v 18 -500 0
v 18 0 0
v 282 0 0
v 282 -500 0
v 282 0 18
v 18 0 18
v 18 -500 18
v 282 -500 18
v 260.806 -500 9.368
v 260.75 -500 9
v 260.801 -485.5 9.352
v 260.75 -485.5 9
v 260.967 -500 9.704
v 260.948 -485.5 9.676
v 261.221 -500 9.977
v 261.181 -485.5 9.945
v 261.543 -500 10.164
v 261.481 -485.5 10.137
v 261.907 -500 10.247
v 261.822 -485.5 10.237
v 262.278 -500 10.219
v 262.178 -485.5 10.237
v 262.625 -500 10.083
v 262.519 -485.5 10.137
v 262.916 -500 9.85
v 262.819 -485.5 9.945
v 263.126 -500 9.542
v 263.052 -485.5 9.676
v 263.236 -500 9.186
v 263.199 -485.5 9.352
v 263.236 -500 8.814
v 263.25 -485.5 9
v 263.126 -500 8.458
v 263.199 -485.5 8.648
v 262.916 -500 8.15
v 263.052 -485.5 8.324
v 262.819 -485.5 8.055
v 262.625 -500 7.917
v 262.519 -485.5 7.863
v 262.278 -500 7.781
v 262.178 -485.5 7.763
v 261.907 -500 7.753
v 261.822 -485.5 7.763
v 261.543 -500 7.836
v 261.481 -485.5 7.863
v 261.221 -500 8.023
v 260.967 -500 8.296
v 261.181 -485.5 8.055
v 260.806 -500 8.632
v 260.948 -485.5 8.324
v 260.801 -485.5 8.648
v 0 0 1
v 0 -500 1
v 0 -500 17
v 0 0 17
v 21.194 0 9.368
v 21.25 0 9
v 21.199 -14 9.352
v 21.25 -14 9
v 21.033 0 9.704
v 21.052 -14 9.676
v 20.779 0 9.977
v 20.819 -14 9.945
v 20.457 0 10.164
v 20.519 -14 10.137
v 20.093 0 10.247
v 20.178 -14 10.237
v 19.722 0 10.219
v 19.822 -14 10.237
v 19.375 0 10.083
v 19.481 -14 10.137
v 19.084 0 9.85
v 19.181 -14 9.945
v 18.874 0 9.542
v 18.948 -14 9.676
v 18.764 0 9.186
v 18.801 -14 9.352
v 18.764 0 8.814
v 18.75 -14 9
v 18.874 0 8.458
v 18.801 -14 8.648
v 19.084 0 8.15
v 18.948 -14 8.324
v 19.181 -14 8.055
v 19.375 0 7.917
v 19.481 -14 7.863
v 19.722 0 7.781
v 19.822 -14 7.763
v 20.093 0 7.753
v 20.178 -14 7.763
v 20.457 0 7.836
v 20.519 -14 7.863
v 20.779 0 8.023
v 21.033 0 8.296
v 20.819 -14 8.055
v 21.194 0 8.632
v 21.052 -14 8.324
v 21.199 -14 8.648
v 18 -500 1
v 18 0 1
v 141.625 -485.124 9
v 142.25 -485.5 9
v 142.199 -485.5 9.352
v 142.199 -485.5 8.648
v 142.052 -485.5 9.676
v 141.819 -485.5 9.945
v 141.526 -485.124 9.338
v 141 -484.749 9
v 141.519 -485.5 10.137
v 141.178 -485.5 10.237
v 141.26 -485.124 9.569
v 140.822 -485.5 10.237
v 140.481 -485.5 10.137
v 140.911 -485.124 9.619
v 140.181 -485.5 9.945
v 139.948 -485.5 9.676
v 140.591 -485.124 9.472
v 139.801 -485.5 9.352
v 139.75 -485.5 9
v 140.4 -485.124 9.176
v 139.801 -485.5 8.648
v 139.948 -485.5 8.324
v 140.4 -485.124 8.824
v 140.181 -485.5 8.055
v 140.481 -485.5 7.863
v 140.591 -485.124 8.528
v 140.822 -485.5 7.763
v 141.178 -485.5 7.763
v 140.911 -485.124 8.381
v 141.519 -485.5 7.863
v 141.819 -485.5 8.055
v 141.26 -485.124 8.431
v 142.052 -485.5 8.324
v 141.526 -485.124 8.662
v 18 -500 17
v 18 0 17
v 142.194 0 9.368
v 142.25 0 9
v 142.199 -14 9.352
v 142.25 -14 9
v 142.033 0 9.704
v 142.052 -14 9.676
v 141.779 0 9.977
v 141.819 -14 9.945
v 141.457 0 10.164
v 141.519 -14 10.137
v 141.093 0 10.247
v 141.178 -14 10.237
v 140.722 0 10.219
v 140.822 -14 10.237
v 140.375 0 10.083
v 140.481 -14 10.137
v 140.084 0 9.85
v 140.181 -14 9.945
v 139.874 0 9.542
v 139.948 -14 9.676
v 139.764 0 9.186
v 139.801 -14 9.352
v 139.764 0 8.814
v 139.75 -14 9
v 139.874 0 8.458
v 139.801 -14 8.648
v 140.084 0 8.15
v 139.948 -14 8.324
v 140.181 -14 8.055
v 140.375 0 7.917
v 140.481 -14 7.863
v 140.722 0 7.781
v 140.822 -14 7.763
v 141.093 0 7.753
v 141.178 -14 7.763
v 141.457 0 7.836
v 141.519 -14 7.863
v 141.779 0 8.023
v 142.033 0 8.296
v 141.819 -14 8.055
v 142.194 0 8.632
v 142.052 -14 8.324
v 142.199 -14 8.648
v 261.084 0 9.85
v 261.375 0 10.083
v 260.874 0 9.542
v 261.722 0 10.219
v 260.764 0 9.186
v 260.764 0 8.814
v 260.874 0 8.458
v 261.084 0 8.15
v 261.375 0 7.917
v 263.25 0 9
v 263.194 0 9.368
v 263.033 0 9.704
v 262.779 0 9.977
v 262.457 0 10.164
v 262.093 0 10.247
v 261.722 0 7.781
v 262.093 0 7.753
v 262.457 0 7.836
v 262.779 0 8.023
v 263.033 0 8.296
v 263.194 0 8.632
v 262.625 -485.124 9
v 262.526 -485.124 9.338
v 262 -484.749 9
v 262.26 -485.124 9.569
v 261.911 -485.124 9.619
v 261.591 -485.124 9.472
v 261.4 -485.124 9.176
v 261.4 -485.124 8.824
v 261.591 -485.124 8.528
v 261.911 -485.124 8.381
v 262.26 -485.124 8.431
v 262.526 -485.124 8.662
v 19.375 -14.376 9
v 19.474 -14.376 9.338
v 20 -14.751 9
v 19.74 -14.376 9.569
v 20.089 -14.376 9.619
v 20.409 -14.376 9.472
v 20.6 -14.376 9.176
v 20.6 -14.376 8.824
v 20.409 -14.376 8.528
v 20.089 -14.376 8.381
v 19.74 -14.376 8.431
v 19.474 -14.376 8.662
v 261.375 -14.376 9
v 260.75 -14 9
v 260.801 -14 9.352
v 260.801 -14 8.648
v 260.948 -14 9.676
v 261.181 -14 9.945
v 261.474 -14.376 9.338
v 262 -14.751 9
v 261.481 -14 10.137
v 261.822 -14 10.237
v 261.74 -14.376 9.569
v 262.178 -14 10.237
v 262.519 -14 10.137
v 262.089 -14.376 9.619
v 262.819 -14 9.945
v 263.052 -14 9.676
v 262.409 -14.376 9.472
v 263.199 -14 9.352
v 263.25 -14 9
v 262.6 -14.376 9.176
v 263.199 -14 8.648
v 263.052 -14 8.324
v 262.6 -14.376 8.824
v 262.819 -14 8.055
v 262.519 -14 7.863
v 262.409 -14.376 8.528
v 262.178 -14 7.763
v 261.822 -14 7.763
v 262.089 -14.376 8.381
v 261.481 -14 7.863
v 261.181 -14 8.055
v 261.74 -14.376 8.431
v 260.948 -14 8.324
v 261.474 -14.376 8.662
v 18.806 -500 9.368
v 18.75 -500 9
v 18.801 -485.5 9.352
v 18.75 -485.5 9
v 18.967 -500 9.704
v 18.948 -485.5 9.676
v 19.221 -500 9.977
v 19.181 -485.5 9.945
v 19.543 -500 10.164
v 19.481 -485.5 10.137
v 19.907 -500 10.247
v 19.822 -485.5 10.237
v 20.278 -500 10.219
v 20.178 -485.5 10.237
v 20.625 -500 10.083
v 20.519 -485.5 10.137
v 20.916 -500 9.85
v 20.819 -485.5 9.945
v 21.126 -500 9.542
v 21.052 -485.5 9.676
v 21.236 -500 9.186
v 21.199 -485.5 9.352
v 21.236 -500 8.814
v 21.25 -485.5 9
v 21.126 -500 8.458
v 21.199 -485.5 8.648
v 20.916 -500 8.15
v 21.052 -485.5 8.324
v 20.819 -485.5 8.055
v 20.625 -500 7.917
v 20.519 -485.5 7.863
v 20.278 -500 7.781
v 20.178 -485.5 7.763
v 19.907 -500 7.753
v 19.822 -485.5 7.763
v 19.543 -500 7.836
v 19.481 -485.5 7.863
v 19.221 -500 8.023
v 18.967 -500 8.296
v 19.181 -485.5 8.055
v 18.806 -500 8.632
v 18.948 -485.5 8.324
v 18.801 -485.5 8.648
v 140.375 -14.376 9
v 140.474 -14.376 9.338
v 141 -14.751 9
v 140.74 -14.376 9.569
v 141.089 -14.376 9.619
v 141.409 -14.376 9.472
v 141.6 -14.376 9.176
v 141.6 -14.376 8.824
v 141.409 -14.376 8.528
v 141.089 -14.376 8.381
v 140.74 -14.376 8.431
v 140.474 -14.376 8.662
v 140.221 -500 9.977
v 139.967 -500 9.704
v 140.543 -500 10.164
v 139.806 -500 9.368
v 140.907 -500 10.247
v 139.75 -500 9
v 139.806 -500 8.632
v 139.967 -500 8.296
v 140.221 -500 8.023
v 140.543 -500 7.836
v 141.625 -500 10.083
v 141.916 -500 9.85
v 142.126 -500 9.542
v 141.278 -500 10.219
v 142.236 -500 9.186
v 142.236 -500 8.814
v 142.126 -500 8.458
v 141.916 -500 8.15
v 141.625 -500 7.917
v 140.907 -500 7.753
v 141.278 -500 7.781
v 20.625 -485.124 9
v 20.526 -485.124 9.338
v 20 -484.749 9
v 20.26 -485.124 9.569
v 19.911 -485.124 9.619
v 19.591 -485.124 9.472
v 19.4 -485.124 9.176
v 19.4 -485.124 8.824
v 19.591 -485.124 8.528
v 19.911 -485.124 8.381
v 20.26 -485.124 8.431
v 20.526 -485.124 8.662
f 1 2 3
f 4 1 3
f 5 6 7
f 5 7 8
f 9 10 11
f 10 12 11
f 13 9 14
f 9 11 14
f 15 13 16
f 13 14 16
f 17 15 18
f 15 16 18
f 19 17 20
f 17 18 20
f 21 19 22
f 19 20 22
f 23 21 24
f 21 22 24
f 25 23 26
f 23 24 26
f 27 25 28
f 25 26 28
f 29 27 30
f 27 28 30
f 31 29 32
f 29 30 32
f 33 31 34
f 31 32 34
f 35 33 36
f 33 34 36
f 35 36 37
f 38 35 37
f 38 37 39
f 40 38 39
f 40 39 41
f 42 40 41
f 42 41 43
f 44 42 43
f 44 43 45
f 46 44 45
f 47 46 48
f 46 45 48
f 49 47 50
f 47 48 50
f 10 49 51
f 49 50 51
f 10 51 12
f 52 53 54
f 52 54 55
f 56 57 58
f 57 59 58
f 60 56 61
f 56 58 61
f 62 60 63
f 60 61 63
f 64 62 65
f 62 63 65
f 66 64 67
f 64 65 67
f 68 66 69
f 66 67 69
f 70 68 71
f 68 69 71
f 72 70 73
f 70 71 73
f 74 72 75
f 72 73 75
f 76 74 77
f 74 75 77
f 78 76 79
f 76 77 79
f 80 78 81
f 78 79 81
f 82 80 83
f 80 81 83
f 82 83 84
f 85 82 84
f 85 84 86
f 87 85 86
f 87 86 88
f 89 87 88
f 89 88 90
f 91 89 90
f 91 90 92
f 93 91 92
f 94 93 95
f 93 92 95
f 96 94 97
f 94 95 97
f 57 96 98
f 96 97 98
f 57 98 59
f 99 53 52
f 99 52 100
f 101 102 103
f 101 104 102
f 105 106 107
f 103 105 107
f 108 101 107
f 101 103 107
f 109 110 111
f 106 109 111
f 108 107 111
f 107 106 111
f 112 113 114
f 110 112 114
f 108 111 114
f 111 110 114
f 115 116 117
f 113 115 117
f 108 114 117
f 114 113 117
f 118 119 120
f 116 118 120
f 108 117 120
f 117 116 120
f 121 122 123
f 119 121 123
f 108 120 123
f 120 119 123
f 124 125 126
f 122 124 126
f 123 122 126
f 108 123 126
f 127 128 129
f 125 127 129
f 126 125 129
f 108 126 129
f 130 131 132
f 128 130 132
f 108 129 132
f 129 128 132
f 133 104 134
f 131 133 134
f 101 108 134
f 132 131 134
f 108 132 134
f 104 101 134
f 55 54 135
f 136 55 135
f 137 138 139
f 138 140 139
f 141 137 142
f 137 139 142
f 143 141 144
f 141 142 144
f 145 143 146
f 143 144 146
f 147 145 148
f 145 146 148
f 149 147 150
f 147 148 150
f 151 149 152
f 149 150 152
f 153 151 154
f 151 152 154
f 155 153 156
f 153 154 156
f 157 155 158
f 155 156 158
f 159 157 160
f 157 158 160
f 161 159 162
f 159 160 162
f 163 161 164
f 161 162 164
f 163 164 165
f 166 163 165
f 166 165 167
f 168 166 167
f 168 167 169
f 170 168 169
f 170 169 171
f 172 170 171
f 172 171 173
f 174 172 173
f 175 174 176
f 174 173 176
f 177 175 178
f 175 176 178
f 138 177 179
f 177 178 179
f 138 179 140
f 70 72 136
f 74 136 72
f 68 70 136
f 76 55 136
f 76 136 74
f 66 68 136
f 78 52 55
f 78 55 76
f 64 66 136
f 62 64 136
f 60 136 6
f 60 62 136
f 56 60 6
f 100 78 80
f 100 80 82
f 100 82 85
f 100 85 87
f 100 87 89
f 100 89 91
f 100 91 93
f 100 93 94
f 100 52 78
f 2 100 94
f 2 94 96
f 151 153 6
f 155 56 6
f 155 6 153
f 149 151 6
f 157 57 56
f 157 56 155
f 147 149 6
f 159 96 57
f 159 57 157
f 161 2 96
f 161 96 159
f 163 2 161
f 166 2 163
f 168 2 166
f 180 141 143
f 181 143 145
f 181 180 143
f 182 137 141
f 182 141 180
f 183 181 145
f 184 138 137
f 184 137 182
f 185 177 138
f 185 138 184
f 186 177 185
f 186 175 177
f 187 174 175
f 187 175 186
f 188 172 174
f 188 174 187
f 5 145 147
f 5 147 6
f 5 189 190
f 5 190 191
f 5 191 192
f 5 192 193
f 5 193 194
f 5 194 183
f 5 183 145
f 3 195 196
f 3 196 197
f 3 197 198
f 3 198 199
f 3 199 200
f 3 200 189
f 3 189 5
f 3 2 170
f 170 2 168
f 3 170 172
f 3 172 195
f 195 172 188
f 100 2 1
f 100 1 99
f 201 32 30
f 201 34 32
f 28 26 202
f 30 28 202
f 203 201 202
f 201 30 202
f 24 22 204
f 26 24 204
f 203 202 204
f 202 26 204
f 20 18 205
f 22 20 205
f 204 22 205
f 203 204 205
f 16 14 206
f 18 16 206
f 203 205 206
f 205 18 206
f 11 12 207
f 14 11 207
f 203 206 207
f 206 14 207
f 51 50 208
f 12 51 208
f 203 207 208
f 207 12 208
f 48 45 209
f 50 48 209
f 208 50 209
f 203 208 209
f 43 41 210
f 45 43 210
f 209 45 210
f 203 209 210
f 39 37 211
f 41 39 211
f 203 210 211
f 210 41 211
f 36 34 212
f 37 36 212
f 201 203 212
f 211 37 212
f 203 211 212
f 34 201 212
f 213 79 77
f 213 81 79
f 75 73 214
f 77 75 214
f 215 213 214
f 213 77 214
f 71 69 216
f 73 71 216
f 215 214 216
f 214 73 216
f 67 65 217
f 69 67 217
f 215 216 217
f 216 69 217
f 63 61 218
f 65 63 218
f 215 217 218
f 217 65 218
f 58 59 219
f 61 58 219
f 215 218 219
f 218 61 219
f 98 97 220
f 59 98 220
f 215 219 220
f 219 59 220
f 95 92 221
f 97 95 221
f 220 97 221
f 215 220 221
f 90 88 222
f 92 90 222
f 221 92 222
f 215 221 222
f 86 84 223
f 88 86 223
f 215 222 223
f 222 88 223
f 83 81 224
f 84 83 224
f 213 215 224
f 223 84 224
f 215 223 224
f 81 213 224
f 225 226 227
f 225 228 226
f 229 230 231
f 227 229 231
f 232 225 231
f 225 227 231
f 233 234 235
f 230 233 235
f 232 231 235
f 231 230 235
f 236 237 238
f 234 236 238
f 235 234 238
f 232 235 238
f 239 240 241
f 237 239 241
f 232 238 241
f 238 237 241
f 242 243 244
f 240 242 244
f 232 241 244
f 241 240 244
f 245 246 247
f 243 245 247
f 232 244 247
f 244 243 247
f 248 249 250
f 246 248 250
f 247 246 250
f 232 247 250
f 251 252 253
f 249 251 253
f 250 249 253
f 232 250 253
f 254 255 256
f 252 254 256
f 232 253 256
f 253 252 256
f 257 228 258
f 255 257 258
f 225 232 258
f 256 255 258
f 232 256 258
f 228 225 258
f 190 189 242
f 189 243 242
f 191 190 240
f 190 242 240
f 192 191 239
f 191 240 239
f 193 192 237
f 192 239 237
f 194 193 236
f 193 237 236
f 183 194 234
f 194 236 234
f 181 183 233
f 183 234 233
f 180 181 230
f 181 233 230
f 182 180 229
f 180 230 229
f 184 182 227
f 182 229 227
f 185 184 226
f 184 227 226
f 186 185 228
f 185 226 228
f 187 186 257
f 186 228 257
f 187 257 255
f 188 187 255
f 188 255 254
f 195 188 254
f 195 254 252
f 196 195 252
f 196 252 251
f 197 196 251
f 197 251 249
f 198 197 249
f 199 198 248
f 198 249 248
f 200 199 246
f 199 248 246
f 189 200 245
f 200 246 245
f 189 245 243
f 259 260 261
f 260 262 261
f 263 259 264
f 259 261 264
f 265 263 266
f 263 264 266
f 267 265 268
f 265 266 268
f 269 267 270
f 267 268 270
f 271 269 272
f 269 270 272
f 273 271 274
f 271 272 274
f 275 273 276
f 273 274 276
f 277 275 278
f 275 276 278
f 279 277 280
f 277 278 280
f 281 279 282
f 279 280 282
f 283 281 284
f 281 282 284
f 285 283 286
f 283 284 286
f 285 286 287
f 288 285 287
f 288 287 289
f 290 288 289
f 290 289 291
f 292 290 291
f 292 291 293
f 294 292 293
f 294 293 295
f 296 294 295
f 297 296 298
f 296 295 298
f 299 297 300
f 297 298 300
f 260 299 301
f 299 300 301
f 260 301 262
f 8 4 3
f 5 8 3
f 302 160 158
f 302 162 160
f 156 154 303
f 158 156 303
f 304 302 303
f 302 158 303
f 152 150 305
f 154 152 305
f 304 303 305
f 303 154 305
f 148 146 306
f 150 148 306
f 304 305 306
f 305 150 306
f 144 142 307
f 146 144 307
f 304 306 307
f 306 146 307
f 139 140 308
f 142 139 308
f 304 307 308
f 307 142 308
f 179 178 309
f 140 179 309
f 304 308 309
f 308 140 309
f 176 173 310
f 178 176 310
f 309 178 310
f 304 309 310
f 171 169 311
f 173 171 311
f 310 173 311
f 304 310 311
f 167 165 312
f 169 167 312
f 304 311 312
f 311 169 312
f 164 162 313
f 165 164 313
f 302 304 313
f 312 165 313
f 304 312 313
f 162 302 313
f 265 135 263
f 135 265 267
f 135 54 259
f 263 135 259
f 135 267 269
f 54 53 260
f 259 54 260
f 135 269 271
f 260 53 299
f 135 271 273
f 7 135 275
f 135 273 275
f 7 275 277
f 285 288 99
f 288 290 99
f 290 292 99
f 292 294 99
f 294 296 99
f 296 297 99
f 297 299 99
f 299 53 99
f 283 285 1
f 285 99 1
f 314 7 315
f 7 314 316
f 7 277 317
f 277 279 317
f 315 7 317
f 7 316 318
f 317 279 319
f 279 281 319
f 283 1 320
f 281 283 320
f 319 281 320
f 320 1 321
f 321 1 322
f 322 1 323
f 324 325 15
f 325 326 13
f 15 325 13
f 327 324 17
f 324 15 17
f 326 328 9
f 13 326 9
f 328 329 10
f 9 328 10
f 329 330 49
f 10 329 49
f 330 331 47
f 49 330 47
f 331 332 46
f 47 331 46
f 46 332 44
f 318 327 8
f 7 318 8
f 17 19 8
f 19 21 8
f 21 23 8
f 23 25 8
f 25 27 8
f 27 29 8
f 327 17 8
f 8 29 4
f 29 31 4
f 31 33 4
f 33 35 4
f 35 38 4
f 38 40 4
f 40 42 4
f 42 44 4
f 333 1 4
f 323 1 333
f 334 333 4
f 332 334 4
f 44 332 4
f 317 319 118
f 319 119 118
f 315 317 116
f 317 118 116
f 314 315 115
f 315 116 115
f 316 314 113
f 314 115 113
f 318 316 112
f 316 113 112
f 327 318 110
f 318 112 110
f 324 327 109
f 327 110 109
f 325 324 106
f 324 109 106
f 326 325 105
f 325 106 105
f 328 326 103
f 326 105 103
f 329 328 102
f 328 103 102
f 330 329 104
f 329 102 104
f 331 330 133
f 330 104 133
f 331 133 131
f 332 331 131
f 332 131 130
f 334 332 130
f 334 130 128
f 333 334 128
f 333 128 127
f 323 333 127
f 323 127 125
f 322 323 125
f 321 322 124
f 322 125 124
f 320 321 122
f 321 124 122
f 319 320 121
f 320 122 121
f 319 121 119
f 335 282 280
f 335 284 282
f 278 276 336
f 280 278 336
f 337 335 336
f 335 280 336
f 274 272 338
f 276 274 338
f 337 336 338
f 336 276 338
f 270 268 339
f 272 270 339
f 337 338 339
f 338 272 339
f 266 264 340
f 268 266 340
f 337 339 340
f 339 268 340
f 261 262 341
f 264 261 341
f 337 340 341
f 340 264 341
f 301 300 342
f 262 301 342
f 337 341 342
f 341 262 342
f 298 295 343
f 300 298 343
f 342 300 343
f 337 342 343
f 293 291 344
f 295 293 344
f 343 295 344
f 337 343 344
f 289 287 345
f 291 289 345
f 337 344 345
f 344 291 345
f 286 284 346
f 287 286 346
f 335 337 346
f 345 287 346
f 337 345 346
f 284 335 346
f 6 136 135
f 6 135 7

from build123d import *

# Parameters (mm, degrees)
F0_W     = 282
F0_H     = 500
F1_DEPTH = 18
F3_D     = 2.5
F3_DEPTH = 14.5
F3_TIP   = 0.7510757738
F5_D     = 2.5
F5_DEPTH = 14
F5_TIP   = 0.7510757738
F6_W     = 18
F6_H     = 1
F7_DEPTH = 500.001


with BuildPart() as f1:
    # F0 (on Top) → F1 (new body)
    with BuildSketch(Plane.XY):
        with Locations((141, -250)):
            Rectangle(F0_W, F0_H)
    extrude(amount=F1_DEPTH)

    # F3
    with Locations(Plane.XZ.offset(500)):
        with Locations((20, 9), (141, 9), (262, 9)):
            Hole(F3_D / 2, depth=F3_DEPTH)
            with Locations((0, 0, -(F3_DEPTH + F3_TIP / 2))):  # 118° drill point
                Cone(0, F3_D / 2, F3_TIP, mode=Mode.SUBTRACT)

    # F5
    with Locations(Plane(origin=(0, 0, 0), x_dir=(-1, 0, 0), z_dir=(0, 1, 0))):
        with Locations((-262, 9), (-141, 9), (-20, 9)):
            Hole(F5_D / 2, depth=F5_DEPTH)
            with Locations((0, 0, -(F5_DEPTH + F5_TIP / 2))):  # 118° drill point
                Cone(0, F5_D / 2, F5_TIP, mode=Mode.SUBTRACT)

    # F6 (on face) → F7 (cut, through all)
    with BuildSketch(Plane.XZ.offset(500)):
        with Locations((9, 17.5)):
            Rectangle(F6_W, F6_H)
        with Locations((9, 0.5)):
            Rectangle(F6_W, F6_H)
    extrude(amount=-F7_DEPTH, mode=Mode.SUBTRACT)


solid = f1.part
